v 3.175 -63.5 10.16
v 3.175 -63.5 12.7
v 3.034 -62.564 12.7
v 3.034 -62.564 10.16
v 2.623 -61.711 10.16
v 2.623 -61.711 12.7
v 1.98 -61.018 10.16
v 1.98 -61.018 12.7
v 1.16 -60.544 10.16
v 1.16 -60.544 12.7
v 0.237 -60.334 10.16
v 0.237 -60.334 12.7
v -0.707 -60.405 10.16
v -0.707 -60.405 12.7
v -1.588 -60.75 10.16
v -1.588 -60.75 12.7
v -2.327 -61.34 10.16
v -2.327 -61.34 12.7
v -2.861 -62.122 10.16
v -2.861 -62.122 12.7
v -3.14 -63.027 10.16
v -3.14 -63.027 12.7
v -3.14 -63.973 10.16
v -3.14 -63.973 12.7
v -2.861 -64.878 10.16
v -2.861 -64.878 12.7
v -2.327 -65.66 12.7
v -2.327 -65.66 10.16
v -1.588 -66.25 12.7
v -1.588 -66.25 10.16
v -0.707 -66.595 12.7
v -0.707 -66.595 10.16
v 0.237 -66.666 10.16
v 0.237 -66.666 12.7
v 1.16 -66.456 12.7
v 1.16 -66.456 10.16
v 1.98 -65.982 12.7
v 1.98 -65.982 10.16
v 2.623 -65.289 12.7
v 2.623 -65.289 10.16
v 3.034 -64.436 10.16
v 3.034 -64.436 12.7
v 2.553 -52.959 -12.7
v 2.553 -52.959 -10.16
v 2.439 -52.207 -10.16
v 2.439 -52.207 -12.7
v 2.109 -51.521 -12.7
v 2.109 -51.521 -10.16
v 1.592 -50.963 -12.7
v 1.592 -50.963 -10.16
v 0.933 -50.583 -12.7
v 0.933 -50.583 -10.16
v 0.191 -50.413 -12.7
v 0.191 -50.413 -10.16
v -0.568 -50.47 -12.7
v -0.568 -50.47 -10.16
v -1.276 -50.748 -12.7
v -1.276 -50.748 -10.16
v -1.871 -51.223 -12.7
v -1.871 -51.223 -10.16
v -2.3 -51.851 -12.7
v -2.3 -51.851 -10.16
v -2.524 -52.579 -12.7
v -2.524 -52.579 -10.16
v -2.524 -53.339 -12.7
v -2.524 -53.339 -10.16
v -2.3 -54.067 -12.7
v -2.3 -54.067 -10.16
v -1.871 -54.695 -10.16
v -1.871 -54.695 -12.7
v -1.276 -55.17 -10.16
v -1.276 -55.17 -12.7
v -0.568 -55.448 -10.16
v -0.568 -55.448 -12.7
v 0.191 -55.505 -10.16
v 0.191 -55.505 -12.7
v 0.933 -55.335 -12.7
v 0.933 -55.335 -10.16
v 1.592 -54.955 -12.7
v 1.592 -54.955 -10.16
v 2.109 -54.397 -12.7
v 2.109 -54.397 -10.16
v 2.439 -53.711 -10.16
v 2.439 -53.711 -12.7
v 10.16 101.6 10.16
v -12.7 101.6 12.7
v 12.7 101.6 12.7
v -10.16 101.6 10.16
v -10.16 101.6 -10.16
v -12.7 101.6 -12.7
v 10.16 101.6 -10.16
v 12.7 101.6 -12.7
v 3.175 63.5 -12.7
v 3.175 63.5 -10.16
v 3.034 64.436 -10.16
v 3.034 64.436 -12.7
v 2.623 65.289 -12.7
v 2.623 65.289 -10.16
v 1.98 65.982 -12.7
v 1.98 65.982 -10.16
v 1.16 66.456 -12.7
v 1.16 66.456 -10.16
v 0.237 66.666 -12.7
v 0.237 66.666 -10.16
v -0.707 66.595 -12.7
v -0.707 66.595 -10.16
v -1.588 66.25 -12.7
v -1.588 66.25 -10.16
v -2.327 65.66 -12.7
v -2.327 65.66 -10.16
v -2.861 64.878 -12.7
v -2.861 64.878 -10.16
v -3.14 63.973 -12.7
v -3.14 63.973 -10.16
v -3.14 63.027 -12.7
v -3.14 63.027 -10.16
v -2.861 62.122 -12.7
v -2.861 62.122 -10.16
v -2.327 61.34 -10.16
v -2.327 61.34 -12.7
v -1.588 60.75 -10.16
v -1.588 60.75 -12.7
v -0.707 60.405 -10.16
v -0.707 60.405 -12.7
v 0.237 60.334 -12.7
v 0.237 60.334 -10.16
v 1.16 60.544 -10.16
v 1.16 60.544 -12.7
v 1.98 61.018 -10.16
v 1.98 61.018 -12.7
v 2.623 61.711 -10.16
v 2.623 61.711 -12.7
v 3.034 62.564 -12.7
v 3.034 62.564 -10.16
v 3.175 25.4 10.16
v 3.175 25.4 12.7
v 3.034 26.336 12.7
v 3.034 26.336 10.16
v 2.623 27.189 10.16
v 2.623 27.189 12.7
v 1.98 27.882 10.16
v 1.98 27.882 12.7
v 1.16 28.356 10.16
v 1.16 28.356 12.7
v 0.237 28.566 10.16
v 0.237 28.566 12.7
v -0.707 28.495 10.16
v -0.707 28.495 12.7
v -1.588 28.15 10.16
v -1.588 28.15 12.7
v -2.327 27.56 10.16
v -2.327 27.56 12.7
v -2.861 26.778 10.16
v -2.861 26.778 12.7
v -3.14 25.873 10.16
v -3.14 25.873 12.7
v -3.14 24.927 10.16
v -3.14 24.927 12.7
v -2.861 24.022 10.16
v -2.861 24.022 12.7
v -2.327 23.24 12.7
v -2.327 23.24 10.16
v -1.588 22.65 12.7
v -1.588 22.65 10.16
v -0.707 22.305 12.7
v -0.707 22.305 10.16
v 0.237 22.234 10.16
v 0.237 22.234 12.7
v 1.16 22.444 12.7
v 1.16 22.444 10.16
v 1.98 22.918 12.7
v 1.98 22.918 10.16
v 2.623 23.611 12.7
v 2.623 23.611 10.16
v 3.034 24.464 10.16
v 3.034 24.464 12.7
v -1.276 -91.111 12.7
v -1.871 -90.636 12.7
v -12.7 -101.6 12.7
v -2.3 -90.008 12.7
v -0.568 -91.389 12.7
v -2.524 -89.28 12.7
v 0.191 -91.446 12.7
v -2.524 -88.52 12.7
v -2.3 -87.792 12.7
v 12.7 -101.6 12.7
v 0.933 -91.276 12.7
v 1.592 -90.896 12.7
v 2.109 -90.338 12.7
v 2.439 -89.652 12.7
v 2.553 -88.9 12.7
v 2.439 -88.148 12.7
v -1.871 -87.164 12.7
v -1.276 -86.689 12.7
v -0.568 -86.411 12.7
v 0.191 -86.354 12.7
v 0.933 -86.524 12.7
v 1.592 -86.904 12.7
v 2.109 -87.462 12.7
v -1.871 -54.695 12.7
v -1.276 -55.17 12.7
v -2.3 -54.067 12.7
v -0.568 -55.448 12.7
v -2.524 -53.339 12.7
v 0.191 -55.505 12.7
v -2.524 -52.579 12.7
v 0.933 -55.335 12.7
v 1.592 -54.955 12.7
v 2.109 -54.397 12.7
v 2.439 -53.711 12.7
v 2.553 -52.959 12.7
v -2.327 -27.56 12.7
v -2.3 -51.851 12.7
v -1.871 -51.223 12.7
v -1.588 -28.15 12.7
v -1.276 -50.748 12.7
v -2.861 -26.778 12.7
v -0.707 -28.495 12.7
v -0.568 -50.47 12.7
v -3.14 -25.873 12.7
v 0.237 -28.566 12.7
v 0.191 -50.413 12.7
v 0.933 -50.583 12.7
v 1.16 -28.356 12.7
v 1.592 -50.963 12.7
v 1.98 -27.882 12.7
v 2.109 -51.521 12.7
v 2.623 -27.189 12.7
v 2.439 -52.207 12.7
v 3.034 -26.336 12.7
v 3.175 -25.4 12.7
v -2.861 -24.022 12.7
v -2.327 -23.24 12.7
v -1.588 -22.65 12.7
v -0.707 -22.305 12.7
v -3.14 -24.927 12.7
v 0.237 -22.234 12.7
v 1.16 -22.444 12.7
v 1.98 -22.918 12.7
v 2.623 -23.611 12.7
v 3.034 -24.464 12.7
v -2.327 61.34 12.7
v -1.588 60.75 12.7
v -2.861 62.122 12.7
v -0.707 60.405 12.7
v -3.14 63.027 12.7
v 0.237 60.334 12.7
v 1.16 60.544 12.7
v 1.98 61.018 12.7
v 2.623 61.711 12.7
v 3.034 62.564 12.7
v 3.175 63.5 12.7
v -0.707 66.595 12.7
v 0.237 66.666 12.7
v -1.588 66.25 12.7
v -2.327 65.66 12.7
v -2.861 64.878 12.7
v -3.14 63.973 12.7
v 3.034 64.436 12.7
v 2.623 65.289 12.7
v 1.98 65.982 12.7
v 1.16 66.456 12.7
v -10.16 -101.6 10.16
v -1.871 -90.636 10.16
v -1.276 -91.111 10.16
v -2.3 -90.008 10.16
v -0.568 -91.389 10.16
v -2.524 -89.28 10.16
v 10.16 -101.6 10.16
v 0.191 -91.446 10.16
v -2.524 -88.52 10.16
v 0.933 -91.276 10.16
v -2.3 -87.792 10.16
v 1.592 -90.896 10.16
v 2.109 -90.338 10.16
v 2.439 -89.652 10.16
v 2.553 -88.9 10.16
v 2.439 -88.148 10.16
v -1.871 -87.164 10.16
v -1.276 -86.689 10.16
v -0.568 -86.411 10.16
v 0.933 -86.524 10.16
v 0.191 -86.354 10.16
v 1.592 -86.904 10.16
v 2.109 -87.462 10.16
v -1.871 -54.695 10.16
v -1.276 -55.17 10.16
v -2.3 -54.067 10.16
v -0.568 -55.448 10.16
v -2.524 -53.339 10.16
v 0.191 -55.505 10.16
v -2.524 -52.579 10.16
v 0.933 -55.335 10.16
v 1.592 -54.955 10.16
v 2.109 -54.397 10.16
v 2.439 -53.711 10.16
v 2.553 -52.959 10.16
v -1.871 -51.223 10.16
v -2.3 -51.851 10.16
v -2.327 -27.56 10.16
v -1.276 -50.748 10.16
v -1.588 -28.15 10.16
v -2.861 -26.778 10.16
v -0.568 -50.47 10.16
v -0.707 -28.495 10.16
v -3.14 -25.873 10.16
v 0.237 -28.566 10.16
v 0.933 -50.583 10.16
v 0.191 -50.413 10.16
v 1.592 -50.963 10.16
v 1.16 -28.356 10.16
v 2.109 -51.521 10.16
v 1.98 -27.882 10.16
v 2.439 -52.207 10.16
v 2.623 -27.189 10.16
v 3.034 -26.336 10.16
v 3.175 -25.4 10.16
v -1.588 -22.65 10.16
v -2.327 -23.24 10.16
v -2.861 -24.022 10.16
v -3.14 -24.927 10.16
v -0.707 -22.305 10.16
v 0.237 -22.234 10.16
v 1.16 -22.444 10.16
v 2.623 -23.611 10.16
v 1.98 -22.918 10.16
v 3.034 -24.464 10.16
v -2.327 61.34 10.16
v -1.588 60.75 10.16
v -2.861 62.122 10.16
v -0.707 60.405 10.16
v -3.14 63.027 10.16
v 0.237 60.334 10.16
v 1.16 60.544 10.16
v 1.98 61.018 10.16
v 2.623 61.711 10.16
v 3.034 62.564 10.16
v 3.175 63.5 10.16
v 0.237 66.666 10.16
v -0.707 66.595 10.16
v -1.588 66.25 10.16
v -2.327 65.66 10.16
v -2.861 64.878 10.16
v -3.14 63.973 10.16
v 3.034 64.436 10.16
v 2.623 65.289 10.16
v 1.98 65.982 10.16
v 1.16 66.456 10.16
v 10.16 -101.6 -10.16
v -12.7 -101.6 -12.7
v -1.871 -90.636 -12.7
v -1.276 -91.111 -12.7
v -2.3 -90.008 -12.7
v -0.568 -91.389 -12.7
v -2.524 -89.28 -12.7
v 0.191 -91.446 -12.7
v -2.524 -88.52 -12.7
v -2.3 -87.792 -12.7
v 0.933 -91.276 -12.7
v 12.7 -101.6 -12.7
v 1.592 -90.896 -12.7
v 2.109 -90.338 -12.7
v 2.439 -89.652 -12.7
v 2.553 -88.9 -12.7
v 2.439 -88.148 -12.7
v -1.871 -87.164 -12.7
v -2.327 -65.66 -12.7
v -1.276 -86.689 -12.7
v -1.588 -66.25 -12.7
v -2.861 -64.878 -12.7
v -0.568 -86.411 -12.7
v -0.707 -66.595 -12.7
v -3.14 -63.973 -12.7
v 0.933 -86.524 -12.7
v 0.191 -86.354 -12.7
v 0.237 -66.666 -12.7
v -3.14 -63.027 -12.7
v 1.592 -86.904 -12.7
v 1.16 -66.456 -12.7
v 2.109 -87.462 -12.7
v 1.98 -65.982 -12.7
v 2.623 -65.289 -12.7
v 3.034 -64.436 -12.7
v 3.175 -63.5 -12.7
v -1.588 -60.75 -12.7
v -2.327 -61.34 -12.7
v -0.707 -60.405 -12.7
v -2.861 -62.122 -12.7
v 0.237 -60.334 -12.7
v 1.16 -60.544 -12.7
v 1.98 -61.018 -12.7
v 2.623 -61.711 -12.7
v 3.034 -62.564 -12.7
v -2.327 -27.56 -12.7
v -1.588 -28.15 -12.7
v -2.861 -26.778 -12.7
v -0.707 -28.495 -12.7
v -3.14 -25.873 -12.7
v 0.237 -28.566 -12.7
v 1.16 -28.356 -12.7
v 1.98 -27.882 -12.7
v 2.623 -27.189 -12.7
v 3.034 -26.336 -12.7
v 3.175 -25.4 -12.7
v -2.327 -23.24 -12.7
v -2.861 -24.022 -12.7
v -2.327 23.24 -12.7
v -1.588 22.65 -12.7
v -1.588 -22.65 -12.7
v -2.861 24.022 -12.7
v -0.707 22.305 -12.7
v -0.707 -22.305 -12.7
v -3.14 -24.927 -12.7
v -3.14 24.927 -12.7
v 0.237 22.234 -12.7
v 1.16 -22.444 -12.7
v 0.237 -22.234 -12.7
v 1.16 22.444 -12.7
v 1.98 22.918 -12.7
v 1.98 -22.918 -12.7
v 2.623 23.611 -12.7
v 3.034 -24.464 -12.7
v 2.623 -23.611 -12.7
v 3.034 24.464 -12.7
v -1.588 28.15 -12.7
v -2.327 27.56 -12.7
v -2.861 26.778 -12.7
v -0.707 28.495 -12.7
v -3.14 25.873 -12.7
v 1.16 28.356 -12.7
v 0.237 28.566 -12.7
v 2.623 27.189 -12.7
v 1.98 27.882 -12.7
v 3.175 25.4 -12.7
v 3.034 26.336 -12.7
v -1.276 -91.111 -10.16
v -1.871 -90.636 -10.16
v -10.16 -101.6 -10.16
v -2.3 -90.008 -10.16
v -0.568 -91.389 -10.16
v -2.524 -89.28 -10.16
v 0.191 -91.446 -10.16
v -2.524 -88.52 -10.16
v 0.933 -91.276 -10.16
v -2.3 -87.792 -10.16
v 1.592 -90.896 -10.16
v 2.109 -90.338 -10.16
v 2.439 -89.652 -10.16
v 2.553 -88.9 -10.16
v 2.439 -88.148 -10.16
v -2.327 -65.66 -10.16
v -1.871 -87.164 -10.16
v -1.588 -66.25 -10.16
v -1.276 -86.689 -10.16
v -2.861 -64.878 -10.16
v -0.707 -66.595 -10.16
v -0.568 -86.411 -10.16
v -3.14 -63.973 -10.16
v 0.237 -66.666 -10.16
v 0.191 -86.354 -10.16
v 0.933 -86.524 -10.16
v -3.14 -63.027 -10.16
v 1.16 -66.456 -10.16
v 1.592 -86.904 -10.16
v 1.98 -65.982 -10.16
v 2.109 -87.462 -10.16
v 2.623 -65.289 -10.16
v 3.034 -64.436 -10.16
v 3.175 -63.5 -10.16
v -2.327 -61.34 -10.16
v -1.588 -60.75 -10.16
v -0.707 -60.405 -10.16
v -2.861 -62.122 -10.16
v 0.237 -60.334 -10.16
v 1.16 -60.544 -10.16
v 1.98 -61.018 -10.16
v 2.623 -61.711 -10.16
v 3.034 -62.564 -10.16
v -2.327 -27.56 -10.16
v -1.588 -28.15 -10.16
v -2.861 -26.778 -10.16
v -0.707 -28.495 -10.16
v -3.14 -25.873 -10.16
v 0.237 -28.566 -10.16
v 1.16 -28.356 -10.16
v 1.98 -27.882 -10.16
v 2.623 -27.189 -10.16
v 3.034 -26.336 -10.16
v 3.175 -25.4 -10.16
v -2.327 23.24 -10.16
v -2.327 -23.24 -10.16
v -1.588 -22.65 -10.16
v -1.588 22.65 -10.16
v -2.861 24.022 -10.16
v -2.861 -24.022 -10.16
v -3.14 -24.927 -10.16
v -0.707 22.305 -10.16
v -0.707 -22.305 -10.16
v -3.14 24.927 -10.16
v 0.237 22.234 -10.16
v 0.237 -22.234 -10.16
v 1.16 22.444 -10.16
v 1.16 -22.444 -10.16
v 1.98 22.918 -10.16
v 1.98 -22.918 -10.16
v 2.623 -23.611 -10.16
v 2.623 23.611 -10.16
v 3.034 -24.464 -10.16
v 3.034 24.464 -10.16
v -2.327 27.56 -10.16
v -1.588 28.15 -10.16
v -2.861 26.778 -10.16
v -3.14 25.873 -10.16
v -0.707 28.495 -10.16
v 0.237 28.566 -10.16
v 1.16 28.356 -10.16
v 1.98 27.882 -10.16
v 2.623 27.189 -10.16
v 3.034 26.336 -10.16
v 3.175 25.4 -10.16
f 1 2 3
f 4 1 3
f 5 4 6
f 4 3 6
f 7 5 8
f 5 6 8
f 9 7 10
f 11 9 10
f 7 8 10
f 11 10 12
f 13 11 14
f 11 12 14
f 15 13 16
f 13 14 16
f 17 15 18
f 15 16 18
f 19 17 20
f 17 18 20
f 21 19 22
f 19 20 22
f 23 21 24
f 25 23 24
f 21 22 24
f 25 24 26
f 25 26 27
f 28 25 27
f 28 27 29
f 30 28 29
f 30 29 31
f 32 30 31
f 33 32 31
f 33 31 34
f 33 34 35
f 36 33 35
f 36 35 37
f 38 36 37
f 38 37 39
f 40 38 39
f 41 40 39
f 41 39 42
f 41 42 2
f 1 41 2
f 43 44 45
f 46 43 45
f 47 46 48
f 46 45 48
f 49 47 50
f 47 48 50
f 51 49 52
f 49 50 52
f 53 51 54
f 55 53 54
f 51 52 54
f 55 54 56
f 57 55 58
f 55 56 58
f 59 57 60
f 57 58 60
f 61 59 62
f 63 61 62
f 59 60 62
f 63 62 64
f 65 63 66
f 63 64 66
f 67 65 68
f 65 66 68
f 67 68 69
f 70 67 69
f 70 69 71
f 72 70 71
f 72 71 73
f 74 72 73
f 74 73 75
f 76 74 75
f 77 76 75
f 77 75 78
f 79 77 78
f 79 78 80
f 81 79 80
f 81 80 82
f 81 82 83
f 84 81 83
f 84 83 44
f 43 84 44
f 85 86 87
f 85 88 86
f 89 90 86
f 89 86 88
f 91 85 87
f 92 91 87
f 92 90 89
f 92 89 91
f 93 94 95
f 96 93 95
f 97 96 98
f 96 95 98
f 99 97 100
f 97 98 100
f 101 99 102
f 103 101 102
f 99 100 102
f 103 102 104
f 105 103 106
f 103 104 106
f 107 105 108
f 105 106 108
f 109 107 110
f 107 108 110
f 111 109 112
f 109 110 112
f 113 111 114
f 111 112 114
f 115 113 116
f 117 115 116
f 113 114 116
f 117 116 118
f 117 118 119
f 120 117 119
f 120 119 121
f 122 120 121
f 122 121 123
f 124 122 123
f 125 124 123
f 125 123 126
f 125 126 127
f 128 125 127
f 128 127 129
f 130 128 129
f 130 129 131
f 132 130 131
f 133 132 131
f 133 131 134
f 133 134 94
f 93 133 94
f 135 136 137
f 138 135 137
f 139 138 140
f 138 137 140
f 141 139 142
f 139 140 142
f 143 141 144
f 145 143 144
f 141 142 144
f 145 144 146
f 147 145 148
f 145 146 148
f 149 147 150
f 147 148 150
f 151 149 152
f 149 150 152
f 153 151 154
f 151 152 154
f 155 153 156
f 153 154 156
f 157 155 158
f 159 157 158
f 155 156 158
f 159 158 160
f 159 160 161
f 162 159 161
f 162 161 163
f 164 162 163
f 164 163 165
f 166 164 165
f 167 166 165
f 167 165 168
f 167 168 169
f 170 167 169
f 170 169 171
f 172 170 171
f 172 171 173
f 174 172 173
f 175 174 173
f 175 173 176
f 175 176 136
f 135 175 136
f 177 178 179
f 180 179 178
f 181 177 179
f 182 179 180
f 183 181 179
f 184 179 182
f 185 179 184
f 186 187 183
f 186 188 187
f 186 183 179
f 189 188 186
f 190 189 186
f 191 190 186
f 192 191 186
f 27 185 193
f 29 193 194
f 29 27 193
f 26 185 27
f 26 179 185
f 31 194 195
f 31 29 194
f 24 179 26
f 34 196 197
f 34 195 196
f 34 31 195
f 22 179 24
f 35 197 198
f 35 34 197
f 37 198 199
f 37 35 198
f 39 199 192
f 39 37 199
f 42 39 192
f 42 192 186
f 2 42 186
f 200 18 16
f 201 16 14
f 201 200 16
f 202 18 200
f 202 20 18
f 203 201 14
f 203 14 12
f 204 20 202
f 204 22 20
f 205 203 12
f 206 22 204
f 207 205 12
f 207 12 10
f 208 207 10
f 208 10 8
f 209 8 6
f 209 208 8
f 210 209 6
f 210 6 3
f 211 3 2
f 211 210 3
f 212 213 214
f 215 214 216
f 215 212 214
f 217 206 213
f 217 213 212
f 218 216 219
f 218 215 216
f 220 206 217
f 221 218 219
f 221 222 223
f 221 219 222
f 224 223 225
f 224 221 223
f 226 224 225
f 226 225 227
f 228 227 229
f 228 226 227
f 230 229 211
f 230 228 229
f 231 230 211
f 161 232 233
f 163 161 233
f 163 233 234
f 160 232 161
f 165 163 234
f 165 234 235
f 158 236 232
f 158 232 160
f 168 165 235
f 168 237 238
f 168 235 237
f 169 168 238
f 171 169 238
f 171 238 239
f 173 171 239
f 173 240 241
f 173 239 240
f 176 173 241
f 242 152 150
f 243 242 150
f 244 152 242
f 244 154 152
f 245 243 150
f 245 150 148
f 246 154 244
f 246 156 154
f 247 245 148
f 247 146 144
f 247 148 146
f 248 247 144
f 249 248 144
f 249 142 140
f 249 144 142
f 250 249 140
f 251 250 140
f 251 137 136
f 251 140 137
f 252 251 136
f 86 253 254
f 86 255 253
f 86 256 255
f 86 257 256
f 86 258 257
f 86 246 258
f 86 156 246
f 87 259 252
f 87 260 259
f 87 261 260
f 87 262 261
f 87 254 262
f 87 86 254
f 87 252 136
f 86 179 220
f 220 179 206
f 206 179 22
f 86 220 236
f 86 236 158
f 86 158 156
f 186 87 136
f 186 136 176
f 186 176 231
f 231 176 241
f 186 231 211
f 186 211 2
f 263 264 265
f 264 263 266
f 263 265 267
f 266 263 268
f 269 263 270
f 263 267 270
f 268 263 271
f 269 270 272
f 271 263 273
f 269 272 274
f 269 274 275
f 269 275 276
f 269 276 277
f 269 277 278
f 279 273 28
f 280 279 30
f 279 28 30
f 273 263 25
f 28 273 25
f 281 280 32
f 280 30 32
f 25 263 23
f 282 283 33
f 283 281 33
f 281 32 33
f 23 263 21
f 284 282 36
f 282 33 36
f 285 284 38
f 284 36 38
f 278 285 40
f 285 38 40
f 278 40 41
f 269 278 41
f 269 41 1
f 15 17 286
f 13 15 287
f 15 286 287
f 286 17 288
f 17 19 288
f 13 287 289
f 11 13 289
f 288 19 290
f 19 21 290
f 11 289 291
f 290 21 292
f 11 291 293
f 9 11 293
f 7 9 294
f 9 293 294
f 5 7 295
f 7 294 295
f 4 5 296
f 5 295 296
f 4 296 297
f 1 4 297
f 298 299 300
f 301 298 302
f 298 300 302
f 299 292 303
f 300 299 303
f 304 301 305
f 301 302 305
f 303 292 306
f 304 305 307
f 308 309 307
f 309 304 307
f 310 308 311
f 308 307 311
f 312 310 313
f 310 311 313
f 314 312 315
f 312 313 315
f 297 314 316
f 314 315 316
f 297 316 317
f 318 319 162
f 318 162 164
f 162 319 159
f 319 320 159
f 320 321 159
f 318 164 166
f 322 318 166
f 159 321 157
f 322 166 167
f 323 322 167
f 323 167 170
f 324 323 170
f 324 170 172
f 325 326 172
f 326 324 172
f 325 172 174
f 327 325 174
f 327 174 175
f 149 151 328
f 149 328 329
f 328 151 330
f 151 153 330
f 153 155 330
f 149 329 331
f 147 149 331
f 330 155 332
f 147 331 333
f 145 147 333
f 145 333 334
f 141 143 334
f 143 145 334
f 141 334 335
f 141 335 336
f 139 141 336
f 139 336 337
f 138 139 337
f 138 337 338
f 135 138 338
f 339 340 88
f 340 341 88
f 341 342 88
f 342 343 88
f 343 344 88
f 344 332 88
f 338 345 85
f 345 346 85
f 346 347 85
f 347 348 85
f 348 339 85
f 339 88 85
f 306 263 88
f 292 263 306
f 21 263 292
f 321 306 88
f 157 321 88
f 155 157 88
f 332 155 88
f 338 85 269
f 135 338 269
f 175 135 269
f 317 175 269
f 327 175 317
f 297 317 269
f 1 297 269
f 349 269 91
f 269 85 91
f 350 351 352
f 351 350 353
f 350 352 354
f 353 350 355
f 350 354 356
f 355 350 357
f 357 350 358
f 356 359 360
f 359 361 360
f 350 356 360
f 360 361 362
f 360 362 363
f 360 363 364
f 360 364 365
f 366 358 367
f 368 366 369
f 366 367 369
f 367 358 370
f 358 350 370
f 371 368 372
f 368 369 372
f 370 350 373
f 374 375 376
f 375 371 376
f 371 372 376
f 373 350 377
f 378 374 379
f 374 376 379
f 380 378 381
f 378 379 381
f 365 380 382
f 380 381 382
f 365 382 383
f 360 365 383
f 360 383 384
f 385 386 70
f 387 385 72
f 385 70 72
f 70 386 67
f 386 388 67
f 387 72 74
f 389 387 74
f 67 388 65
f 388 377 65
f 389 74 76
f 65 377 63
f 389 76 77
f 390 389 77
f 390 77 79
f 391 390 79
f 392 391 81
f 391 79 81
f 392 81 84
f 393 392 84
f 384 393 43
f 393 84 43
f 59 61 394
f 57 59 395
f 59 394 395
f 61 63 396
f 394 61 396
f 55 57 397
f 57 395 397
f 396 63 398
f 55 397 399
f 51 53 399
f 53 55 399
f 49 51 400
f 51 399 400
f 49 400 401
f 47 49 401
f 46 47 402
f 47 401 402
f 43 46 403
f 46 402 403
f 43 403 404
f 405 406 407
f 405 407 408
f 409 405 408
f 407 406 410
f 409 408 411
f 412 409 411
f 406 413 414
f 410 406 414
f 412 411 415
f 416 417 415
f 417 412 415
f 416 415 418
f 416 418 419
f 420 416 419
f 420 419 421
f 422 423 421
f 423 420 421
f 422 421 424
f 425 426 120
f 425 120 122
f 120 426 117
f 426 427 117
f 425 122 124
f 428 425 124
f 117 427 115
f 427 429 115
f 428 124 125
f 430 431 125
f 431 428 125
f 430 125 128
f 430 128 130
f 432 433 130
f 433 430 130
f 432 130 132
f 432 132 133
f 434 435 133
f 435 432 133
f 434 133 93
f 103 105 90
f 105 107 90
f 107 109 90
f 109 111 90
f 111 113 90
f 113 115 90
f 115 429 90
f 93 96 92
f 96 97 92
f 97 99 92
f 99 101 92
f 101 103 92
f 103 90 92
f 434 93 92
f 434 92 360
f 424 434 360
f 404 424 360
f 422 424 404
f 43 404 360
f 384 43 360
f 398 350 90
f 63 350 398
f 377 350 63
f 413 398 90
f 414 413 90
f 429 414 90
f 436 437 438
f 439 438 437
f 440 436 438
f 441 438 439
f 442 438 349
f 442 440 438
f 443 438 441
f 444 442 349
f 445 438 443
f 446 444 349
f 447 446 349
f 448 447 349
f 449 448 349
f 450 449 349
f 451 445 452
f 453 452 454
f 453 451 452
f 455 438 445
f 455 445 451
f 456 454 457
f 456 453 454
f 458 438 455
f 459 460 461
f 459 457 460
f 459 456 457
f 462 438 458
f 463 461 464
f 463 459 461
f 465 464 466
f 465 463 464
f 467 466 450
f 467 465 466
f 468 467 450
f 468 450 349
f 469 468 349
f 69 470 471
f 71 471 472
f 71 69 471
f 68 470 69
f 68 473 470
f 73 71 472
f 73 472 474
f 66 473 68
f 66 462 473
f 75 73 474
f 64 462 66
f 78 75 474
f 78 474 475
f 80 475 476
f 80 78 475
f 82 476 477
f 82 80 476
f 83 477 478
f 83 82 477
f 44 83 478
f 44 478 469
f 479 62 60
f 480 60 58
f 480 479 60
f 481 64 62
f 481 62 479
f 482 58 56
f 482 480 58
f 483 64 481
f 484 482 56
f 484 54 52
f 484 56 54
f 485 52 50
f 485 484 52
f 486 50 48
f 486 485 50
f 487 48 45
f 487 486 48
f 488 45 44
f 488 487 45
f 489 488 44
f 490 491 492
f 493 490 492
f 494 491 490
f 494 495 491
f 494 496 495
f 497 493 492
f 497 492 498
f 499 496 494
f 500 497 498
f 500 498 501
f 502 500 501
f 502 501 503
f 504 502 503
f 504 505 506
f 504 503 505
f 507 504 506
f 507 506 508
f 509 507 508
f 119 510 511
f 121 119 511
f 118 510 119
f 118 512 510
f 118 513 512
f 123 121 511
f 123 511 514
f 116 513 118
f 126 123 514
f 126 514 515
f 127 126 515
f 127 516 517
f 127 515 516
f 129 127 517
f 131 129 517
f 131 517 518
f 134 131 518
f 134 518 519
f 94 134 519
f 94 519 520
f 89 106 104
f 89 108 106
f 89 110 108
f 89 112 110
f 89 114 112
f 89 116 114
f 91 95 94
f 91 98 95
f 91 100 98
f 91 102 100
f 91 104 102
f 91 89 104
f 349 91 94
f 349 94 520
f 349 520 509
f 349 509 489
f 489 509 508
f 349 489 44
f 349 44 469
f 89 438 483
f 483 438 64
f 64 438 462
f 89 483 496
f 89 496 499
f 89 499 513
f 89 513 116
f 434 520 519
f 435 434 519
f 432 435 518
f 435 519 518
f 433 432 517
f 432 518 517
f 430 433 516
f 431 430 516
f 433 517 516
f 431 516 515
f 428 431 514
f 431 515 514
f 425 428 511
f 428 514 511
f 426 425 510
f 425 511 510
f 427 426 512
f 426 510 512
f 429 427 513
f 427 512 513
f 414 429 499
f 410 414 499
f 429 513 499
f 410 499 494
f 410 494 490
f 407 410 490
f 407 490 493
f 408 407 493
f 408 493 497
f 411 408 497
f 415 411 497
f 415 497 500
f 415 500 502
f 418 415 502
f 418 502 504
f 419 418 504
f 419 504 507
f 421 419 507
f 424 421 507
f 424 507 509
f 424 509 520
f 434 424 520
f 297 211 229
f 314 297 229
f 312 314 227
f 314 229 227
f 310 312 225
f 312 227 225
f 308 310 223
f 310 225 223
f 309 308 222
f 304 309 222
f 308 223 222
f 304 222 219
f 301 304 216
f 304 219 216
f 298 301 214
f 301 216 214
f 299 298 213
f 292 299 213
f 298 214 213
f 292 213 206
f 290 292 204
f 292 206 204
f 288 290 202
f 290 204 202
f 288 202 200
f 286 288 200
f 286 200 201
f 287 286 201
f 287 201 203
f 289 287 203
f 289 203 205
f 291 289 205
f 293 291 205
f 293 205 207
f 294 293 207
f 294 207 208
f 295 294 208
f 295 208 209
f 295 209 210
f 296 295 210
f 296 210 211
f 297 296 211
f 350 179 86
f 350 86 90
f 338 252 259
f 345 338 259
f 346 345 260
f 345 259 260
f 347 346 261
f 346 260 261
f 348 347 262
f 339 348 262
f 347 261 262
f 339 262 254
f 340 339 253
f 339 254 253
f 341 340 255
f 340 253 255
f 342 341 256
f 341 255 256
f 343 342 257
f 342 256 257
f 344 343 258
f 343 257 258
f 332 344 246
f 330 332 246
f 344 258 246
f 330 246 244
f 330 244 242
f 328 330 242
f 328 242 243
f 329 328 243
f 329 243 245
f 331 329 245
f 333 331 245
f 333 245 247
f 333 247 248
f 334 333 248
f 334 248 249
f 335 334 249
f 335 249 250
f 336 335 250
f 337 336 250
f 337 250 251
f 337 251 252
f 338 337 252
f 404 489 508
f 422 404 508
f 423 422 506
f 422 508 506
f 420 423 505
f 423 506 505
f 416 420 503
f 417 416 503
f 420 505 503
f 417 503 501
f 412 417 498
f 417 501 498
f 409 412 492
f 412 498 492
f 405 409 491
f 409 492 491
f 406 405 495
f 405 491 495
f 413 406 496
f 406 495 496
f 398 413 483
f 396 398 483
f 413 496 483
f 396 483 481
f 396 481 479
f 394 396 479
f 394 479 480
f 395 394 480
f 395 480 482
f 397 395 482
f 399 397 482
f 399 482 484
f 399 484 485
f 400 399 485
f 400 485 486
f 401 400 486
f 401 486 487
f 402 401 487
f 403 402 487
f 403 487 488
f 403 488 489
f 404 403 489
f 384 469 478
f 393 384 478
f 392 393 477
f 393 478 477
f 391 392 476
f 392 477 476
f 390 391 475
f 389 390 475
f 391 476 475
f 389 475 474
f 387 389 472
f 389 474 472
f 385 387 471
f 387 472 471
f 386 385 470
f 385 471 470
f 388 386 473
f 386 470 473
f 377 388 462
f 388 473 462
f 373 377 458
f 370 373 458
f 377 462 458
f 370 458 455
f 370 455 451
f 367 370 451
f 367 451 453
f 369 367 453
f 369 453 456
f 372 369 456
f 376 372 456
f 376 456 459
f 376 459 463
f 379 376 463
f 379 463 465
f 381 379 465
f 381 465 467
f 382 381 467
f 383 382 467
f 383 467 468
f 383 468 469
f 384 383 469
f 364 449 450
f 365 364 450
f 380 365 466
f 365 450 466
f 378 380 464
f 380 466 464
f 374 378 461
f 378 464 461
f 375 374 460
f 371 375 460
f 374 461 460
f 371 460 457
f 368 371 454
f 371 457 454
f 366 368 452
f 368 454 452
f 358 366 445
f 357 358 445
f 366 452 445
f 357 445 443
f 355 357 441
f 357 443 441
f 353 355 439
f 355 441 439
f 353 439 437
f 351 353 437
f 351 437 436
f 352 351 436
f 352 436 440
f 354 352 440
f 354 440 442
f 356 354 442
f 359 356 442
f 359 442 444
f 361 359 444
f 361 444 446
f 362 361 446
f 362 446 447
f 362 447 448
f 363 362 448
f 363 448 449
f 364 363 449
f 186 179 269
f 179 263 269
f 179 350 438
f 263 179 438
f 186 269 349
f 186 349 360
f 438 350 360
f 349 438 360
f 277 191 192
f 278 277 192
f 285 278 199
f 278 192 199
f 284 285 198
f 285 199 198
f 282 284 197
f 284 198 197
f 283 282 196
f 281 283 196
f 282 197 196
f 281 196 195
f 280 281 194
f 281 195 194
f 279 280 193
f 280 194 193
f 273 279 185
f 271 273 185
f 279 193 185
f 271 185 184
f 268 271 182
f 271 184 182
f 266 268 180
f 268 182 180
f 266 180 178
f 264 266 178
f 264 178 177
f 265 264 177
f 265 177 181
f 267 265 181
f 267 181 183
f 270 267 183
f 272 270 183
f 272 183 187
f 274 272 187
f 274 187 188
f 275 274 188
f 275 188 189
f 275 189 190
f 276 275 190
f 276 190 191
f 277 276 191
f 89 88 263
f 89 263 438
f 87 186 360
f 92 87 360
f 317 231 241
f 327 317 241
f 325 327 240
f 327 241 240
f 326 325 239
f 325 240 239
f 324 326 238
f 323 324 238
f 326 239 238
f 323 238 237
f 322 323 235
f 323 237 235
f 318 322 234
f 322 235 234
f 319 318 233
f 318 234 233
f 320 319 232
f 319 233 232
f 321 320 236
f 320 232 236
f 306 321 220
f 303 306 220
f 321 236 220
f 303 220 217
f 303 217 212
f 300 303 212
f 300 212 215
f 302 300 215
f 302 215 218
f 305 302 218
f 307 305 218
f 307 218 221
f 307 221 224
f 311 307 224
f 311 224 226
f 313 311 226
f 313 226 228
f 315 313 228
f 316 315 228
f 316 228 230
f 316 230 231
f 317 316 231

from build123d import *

# Parameters (mm, degrees)
SKETCH1_W              = 25.4
SKETCH1_H              = 25.4
SKETCH1_W_2            = 20.32
SKETCH1_H_2            = 20.32
BOSS_EXTRUDE1_DEPTH    = 101.6
SKETCH4_R              = 3.175
CUT_EXTRUDE3_DEPTH     = 25.4
SKETCH5_R              = 3.175
CUT_EXTRUDE4_DEPTH     = 25.4
SKETCH6_R              = 1.27
CUT_EXTRUDE6_DEPTH     = 25.4
F_10_CLEARANCE_HOLE1_D = 5.1054


with BuildPart() as part:
    # Sketch1 → Boss-Extrude1 (new, symmetric)
    with BuildSketch(Plane(origin=(0, 0, 0), x_dir=(1, 0, 0), z_dir=(0, 1, 0))):
        Rectangle(SKETCH1_W, SKETCH1_H)
        Rectangle(SKETCH1_W_2, SKETCH1_H_2, mode=Mode.SUBTRACT)
    extrude(amount=BOSS_EXTRUDE1_DEPTH, both=True)

    # Sketch4 → Cut-Extrude3 (cut)
    with BuildSketch(Plane.XY.offset(12.7)):
        with Locations((0, 63.5)):
            Circle(SKETCH4_R)
        with Locations((0, -63.5)):
            Circle(SKETCH4_R)
    extrude(amount=-CUT_EXTRUDE3_DEPTH, mode=Mode.SUBTRACT)

    # Sketch5 → Cut-Extrude4 (cut)
    with BuildSketch(Plane.XY.offset(12.7)):
        with Locations((0, 25.4)):
            Circle(SKETCH5_R)
        with Locations((0, -25.4)):
            Circle(SKETCH5_R)
    extrude(amount=-CUT_EXTRUDE4_DEPTH, mode=Mode.SUBTRACT)

    # Sketch6 → Cut-Extrude6 (cut)
    with BuildSketch(Plane.XY.offset(12.7)):
        with Locations((0, -88.9)):
            Circle(SKETCH6_R)
        with Locations((0, -52.959)):
            Circle(SKETCH6_R)
    extrude(amount=-CUT_EXTRUDE6_DEPTH, mode=Mode.SUBTRACT)

    # #10 Clearance Hole1 (through all)
    with Locations(Plane(origin=(0, 0, -12.7), x_dir=(-1, 0, 0), z_dir=(0, 0, -1))):
        with Locations((0, -52.959), (0, -88.9)):
            Hole(F_10_CLEARANCE_HOLE1_D / 2)


solid = part.part
